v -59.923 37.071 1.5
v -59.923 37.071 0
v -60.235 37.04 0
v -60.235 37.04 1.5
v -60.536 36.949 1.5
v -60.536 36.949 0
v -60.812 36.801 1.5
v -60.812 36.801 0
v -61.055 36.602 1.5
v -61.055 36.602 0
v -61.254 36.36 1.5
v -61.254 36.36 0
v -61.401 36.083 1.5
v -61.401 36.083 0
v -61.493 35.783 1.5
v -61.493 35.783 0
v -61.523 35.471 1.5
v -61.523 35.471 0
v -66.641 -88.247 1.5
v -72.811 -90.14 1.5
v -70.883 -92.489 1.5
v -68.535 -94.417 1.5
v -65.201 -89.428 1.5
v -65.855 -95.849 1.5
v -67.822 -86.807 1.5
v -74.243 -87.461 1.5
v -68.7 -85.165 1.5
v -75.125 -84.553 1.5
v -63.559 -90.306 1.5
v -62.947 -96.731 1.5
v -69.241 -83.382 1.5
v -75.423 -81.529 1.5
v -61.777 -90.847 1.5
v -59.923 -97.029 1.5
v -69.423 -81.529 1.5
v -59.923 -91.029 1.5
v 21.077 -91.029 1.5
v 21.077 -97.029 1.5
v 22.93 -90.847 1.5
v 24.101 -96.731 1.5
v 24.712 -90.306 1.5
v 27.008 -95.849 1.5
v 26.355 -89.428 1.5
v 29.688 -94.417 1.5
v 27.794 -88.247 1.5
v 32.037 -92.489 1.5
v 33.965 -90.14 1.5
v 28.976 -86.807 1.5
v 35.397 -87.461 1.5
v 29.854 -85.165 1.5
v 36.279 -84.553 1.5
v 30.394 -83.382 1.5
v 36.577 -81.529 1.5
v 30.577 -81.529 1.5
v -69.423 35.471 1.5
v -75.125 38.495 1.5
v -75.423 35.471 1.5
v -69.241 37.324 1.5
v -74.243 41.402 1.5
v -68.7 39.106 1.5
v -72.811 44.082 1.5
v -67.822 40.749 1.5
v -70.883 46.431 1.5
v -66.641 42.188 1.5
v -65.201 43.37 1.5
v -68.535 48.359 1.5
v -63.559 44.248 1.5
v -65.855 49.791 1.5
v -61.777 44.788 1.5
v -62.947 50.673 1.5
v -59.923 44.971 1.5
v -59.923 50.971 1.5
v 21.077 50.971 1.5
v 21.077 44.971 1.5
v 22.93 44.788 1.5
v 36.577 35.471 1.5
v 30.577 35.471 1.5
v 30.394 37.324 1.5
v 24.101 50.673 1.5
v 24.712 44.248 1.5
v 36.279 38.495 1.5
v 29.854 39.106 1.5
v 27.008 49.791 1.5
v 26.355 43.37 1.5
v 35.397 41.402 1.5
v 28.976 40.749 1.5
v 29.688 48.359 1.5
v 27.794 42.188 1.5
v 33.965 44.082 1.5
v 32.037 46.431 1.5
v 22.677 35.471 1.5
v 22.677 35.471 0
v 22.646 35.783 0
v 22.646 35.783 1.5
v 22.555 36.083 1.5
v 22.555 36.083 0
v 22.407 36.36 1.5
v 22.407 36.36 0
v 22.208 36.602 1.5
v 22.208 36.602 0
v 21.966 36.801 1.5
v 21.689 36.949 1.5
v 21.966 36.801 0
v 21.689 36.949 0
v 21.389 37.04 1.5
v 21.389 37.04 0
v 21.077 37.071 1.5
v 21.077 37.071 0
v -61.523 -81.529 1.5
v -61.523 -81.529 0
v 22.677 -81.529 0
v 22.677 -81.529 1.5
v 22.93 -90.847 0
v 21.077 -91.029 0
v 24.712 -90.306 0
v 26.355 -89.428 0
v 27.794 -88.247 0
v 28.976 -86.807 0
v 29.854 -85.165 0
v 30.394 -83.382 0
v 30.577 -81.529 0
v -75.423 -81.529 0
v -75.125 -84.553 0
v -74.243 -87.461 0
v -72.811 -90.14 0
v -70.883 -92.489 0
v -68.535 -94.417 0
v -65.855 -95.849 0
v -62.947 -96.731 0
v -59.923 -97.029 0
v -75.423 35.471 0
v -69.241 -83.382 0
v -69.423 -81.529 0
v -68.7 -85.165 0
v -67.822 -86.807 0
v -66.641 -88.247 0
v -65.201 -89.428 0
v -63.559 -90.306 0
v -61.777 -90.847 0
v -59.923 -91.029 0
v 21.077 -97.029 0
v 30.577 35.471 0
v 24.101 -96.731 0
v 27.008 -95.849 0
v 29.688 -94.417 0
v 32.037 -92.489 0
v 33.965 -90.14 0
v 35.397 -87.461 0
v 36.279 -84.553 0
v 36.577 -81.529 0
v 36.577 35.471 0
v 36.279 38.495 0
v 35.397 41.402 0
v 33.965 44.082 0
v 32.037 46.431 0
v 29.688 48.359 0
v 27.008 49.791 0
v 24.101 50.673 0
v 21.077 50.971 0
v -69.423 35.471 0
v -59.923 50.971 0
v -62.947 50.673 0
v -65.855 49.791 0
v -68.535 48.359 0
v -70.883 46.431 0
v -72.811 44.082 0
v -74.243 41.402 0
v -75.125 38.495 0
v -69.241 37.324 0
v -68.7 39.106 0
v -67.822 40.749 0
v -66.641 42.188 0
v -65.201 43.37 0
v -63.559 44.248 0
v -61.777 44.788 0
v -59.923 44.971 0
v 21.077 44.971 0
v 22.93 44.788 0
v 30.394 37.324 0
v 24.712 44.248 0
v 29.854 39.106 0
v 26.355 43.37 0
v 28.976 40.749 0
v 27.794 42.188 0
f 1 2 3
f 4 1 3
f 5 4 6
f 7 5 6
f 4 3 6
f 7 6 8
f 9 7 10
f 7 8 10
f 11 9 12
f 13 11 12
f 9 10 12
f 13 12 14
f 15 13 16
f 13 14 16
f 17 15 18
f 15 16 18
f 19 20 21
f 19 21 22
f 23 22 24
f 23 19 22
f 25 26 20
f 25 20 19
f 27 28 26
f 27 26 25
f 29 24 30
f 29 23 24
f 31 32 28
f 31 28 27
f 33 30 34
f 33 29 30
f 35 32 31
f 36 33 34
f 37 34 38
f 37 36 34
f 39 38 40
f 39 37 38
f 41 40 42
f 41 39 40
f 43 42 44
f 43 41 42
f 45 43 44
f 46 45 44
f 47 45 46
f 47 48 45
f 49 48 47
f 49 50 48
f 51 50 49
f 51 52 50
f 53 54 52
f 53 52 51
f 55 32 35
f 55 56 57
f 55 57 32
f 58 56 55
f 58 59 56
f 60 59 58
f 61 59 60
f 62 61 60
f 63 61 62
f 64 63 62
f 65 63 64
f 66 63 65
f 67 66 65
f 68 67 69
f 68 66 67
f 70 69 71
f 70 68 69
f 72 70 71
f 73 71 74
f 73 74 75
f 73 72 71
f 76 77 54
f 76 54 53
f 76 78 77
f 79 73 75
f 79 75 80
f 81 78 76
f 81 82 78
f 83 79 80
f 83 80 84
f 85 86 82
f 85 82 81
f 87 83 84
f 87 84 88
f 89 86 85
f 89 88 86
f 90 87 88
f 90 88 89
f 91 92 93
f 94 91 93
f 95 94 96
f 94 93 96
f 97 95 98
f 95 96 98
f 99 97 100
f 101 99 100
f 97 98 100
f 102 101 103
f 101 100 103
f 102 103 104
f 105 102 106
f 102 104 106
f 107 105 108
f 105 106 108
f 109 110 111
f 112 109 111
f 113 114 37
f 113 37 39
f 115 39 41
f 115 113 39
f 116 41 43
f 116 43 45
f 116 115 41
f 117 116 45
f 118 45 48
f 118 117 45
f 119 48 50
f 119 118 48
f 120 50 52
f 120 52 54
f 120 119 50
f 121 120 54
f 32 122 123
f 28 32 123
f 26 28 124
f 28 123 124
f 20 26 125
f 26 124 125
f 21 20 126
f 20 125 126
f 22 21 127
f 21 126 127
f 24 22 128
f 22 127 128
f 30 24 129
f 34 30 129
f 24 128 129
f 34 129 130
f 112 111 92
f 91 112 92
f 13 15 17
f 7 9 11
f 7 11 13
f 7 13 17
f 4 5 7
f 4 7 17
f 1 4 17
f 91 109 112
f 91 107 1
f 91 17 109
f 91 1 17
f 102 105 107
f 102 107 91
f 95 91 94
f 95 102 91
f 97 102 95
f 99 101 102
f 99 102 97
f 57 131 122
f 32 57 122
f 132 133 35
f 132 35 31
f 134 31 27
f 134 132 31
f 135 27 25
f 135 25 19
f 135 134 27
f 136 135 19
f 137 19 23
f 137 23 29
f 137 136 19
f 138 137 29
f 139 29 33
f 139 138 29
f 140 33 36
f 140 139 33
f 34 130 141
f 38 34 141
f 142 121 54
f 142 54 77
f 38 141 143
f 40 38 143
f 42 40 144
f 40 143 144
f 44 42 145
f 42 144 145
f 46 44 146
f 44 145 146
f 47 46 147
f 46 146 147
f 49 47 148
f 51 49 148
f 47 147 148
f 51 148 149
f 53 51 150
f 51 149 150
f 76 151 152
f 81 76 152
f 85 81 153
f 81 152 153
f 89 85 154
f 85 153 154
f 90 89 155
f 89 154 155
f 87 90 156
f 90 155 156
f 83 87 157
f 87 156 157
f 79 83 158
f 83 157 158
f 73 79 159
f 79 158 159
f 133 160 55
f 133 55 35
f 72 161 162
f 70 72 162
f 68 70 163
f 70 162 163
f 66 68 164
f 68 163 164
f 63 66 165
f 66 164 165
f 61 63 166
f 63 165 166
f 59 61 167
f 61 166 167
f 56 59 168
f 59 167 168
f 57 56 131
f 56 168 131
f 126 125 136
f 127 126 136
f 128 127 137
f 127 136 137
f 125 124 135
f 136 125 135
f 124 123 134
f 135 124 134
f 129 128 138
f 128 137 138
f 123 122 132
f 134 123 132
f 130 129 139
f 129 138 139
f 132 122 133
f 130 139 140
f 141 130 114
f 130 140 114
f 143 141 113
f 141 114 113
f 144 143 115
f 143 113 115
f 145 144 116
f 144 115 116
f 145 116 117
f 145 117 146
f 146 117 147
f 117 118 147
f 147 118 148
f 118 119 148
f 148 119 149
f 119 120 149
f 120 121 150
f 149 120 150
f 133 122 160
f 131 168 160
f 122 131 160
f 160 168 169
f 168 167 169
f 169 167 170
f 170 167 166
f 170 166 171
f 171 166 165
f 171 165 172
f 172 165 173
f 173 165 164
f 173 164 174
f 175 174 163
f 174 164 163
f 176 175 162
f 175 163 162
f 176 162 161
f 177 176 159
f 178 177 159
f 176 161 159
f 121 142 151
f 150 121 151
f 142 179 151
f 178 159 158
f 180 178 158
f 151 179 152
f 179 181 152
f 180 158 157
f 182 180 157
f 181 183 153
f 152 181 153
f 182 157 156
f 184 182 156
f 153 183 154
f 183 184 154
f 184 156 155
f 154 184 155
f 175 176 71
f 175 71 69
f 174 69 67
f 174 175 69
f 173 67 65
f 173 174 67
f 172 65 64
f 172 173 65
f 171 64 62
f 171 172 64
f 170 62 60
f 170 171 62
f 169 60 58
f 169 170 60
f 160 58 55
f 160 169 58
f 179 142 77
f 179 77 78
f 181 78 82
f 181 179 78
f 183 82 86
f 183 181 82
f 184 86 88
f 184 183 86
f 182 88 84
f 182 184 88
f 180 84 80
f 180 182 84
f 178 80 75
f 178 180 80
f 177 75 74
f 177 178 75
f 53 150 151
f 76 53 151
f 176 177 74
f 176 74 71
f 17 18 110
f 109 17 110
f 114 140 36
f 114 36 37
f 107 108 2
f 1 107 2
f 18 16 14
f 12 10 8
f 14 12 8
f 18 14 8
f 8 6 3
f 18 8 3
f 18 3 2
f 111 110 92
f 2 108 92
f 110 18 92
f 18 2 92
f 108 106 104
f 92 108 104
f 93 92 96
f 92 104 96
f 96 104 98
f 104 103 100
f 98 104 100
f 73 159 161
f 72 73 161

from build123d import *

# Parameters (mm, degrees)
BOSS_EXTRUDE1_DEPTH   = 1.5
BOSS_EXTRUDE1_2_DEPTH = 1.5


with BuildPart() as part:
    # Sketch1 → Boss-Extrude1 (new body)
    with BuildSketch(Plane.XY):
        with BuildLine():
            Line((-61.52326721, -81.529096158), (22.67673279, -81.529096158))
            Line((22.67673279, -81.529096158), (22.67673279, 35.470903842))
            ThreePointArc((22.67673279, 35.470903842), (22.20810364, 36.602274691), (21.07673279, 37.070903842))
            Line((21.07673279, 37.070903842), (-59.92326721, 37.070903842))
            ThreePointArc((-59.92326721, 37.070903842), (-61.054638059, 36.602274691), (-61.52326721, 35.470903842))
            Line((-61.52326721, 35.470903842), (-61.52326721, -81.529096158))
        make_face()
    extrude(amount=BOSS_EXTRUDE1_DEPTH)


with BuildPart() as body_2:
    # Sketch1 → Boss-Extrude1 2 (new body)
    with BuildSketch(Plane.XY):
        with BuildLine():
            Line((-59.92326721, -97.029096158), (21.07673279, -97.029096158))
            ThreePointArc((21.07673279, -97.029096158), (32.036887899, -92.489251267), (36.57673279, -81.529096158))
            Line((36.57673279, -81.529096158), (36.57673279, 35.470903842))
            ThreePointArc((36.57673279, 35.470903842), (32.036887899, 46.43105895), (21.07673279, 50.970903842))
            Line((21.07673279, 50.970903842), (-59.92326721, 50.970903842))
            ThreePointArc((-59.92326721, 50.970903842), (-70.883422318, 46.43105895), (-75.42326721, 35.470903842))
            Line((-75.42326721, 35.470903842), (-75.42326721, -81.529096158))
            ThreePointArc((-75.42326721, -81.529096158), (-70.883422318, -92.489251267), (-59.92326721, -97.029096158))
        make_face()
        with BuildLine():
            Line((30.57673279, -81.529096158), (30.57673279, 35.470903842))
            ThreePointArc((30.57673279, 35.470903842), (27.794247212, 42.188418263), (21.07673279, 44.970903842))
            Line((21.07673279, 44.970903842), (-59.92326721, 44.970903842))
            ThreePointArc((-59.92326721, 44.970903842), (-66.640781631, 42.188418263), (-69.42326721, 35.470903842))
            Line((-69.42326721, 35.470903842), (-69.42326721, -81.529096158))
            ThreePointArc((-69.42326721, -81.529096158), (-66.640781631, -88.24661058), (-59.92326721, -91.029096158))
            Line((-59.92326721, -91.029096158), (21.07673279, -91.029096158))
            ThreePointArc((21.07673279, -91.029096158), (27.794247212, -88.24661058), (30.57673279, -81.529096158))
        make_face(mode=Mode.SUBTRACT)
    extrude(amount=BOSS_EXTRUDE1_2_DEPTH)


solid = Compound([part.part, body_2.part])
